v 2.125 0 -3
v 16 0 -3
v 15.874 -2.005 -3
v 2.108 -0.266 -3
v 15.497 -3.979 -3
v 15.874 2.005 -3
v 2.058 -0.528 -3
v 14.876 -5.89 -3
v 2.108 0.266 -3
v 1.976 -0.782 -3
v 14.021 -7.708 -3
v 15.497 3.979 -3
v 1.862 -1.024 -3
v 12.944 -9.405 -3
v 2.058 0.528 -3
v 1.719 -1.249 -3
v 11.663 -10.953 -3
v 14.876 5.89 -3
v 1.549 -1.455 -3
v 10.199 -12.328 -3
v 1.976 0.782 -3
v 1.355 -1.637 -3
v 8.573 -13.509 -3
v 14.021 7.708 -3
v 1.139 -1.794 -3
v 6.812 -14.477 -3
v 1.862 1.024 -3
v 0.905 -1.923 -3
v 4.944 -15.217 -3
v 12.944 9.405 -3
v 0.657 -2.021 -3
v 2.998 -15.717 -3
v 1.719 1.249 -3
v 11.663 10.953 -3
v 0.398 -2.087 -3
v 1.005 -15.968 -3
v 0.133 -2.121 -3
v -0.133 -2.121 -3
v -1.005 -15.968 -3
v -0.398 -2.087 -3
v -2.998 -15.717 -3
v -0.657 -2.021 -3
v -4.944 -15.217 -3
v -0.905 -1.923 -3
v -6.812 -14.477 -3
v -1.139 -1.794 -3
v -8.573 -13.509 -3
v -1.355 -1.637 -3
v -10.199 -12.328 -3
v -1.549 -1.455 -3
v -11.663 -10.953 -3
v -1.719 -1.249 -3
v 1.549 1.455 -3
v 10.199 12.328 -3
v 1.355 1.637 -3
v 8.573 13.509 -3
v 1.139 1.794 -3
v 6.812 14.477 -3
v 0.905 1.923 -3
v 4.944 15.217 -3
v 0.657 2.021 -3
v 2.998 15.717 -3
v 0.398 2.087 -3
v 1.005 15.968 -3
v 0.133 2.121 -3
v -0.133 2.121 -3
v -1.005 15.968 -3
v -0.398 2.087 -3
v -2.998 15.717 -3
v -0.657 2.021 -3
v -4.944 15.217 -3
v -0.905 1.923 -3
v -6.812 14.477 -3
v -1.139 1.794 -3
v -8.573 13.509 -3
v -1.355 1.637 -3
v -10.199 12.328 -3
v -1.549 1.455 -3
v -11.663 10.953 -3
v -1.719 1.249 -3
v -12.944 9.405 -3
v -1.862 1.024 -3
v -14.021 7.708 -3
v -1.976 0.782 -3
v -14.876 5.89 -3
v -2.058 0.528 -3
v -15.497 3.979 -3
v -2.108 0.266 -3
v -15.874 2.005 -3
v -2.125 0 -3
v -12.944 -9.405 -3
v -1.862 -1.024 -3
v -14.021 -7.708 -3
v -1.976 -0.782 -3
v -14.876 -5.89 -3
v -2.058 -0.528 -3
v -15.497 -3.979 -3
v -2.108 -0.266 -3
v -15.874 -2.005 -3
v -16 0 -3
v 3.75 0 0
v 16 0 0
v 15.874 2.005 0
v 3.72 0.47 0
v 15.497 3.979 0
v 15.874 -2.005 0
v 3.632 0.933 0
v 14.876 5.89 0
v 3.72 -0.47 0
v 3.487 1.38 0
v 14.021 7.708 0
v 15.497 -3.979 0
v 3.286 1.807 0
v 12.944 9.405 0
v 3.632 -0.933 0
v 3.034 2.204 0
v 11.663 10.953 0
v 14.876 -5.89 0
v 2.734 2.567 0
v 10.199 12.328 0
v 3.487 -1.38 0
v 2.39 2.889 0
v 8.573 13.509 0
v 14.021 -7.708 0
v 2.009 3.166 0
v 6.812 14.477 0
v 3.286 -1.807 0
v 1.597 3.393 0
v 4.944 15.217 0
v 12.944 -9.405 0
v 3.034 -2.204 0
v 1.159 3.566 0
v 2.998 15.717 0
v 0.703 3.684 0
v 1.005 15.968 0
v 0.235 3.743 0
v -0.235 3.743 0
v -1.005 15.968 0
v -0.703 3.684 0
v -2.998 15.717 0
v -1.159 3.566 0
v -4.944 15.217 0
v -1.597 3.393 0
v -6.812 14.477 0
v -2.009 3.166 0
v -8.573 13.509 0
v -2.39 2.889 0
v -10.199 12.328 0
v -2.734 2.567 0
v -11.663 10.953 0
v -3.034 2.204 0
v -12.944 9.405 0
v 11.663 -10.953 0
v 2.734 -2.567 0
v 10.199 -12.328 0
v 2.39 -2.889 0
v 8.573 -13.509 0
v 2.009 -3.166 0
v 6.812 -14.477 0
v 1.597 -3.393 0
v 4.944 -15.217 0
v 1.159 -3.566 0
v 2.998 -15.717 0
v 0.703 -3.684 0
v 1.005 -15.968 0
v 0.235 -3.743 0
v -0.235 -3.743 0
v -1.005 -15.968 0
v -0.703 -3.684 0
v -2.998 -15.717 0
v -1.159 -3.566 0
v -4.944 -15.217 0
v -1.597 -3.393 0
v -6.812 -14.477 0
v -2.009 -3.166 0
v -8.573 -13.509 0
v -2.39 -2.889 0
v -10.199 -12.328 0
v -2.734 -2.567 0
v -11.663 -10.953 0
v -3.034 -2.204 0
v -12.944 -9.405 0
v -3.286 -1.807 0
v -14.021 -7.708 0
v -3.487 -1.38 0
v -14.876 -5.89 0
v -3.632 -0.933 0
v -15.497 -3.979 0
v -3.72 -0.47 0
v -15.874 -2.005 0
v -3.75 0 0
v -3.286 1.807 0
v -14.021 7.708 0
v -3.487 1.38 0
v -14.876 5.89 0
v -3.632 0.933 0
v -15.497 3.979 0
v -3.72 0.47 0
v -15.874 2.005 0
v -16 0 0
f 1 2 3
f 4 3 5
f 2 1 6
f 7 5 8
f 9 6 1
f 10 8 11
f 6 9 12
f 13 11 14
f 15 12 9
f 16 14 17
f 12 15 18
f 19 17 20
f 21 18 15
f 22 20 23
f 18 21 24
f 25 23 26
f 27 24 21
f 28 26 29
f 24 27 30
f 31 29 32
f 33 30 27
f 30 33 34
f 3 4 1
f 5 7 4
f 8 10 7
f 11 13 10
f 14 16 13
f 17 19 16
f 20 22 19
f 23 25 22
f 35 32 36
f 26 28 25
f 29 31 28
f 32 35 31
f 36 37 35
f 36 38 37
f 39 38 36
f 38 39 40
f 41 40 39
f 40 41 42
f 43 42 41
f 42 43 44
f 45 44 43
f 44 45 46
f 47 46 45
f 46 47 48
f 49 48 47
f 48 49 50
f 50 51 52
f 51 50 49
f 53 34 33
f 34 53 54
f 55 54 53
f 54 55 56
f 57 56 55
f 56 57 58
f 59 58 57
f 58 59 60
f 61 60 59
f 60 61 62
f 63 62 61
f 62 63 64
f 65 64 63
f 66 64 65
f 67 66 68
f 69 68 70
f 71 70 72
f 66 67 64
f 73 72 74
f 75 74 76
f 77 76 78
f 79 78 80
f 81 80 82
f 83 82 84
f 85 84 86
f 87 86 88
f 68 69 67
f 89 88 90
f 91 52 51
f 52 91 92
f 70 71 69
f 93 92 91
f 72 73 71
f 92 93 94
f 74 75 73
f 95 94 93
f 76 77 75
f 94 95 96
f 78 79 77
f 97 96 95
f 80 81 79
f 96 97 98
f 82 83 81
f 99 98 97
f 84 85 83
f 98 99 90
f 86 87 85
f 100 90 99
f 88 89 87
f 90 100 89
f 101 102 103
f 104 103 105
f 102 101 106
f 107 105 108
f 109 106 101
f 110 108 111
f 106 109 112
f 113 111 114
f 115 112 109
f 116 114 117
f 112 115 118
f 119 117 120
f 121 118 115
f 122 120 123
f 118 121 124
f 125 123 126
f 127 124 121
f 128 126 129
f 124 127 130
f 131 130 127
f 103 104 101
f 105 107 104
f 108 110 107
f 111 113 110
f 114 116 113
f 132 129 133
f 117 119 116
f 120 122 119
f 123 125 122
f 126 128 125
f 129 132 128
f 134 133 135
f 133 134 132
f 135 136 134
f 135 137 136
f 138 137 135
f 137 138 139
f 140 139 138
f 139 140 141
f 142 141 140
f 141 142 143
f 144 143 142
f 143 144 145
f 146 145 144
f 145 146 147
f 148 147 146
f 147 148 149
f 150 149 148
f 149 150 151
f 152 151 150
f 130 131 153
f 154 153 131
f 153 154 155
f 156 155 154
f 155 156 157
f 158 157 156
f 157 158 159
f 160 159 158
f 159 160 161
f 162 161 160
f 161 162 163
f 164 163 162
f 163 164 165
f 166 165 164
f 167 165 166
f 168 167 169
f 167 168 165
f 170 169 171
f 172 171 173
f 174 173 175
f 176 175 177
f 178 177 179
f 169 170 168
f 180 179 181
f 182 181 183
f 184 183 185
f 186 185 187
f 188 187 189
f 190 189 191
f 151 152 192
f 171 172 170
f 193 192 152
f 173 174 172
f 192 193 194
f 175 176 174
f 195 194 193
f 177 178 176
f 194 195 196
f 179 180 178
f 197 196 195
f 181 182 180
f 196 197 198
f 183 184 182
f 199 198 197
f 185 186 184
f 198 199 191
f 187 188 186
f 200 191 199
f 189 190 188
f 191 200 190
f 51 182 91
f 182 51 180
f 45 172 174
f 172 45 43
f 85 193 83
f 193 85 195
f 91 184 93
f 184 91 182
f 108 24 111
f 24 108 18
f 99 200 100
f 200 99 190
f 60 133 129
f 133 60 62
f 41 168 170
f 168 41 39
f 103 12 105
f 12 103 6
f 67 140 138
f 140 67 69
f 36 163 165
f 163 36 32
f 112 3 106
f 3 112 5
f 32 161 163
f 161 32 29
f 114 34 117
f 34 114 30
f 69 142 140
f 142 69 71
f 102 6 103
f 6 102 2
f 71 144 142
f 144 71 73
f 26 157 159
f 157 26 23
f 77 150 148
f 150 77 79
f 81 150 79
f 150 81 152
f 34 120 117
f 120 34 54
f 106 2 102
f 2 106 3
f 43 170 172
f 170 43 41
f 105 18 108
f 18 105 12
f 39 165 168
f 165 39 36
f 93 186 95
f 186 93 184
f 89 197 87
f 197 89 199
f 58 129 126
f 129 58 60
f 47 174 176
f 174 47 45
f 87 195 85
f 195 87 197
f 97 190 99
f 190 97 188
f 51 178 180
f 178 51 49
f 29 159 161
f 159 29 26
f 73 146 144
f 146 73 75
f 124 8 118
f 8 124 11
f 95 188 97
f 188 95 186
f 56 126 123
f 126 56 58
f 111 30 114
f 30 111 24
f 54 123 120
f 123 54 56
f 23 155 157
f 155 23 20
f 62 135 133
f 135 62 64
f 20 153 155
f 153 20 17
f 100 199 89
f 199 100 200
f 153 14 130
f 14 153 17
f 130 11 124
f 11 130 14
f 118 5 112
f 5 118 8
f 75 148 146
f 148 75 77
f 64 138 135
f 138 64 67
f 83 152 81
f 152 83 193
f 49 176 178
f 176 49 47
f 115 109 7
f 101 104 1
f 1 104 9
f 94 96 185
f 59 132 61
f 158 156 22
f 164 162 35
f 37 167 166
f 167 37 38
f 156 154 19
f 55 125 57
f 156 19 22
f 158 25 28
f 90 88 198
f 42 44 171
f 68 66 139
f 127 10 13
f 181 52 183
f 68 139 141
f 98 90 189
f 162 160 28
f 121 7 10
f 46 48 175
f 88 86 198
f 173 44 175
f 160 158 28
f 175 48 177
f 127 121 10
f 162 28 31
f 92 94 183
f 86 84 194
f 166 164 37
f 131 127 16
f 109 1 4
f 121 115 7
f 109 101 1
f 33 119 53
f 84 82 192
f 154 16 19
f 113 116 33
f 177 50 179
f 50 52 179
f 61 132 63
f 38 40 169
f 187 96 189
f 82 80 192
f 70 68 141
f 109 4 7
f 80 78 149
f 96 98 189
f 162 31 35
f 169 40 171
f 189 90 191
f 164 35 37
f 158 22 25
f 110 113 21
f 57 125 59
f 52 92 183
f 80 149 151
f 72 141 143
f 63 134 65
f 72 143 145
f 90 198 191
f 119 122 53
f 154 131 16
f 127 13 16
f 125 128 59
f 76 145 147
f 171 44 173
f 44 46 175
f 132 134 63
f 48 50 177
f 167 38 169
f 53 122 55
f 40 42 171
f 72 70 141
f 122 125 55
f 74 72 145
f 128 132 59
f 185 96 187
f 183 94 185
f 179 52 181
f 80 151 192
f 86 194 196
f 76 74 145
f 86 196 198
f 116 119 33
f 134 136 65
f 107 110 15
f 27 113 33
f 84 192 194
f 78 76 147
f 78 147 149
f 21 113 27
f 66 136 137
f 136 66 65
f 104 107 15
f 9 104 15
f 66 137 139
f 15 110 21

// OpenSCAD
$fn = 50;


difference() {
	union() {
		translate(v = [0, 0, -3.0000000000]) {
			cylinder(h = 3, r = 10.0000000000);
		}
		translate(v = [0, 0, -3.0000000000]) {
			cylinder(h = 3, r = 16.0000000000);
		}
	}
	union() {
		translate(v = [0, 0, 0]) {
			rotate(a = [0, 0, 0]) {
				difference() {
					union() {
						#translate(v = [0, 0, -3.0000000000]) {
							cylinder(h = 3, r = 2.0000000000);
						}
						#translate(v = [0, 0, -3]) {
							cylinder(h = 3, r = 10.0000000000, r1 = 2.1250000000, r2 = 3.7500000000);
						}
						#translate(v = [0, 0, -3.0000000000]) {
							cylinder(h = 3, r = 2.1250000000);
						}
						#translate(v = [0, 0, -3.0000000000]) {
							cylinder(h = 3, r = 2.0000000000);
						}
					}
					union();
				}
			}
		}
	}
}
